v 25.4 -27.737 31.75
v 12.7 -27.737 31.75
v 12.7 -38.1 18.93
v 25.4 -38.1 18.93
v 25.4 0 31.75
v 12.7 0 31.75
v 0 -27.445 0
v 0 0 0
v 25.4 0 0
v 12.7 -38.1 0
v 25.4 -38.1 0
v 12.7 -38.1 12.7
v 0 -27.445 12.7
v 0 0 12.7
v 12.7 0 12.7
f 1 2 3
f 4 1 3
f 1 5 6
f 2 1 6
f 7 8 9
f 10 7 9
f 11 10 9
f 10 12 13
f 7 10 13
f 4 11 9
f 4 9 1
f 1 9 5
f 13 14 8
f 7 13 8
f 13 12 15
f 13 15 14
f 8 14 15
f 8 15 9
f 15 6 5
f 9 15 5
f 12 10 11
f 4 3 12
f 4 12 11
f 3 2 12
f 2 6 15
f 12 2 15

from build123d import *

# Parameters (mm, degrees)
F1_DEPTH = 38.1
F3_DEPTH = 25.4
F5_DEPTH = 25.4


with BuildPart() as f1:
    # F0 (on Front) → F1 (new body)
    with BuildSketch(Plane.XZ):
        Polygon((0, 12.7), (0, 0), (25.4, 0), (25.4, 31.75), (12.7, 31.75), (12.7, 12.7), align=None)
    extrude(amount=F1_DEPTH)

    # F2 (on face) → F3 (cut)
    with BuildSketch(Plane.XY.offset(12.7)):
        Polygon((0, -38.1), (12.7, -38.1), (0, -27.445292), align=None)
    extrude(amount=-F3_DEPTH, mode=Mode.SUBTRACT)

    # F4 (on face) → F5 (cut)
    with BuildSketch(Plane(origin=(12.7, 0, 0), x_dir=(0, -1, 0), z_dir=(-1, 0, 0))):
        Polygon((27.73655, 31.75), (38.1, 18.929737), (38.1, 31.75), align=None)
    extrude(amount=-F5_DEPTH, mode=Mode.SUBTRACT)


solid = f1.part
